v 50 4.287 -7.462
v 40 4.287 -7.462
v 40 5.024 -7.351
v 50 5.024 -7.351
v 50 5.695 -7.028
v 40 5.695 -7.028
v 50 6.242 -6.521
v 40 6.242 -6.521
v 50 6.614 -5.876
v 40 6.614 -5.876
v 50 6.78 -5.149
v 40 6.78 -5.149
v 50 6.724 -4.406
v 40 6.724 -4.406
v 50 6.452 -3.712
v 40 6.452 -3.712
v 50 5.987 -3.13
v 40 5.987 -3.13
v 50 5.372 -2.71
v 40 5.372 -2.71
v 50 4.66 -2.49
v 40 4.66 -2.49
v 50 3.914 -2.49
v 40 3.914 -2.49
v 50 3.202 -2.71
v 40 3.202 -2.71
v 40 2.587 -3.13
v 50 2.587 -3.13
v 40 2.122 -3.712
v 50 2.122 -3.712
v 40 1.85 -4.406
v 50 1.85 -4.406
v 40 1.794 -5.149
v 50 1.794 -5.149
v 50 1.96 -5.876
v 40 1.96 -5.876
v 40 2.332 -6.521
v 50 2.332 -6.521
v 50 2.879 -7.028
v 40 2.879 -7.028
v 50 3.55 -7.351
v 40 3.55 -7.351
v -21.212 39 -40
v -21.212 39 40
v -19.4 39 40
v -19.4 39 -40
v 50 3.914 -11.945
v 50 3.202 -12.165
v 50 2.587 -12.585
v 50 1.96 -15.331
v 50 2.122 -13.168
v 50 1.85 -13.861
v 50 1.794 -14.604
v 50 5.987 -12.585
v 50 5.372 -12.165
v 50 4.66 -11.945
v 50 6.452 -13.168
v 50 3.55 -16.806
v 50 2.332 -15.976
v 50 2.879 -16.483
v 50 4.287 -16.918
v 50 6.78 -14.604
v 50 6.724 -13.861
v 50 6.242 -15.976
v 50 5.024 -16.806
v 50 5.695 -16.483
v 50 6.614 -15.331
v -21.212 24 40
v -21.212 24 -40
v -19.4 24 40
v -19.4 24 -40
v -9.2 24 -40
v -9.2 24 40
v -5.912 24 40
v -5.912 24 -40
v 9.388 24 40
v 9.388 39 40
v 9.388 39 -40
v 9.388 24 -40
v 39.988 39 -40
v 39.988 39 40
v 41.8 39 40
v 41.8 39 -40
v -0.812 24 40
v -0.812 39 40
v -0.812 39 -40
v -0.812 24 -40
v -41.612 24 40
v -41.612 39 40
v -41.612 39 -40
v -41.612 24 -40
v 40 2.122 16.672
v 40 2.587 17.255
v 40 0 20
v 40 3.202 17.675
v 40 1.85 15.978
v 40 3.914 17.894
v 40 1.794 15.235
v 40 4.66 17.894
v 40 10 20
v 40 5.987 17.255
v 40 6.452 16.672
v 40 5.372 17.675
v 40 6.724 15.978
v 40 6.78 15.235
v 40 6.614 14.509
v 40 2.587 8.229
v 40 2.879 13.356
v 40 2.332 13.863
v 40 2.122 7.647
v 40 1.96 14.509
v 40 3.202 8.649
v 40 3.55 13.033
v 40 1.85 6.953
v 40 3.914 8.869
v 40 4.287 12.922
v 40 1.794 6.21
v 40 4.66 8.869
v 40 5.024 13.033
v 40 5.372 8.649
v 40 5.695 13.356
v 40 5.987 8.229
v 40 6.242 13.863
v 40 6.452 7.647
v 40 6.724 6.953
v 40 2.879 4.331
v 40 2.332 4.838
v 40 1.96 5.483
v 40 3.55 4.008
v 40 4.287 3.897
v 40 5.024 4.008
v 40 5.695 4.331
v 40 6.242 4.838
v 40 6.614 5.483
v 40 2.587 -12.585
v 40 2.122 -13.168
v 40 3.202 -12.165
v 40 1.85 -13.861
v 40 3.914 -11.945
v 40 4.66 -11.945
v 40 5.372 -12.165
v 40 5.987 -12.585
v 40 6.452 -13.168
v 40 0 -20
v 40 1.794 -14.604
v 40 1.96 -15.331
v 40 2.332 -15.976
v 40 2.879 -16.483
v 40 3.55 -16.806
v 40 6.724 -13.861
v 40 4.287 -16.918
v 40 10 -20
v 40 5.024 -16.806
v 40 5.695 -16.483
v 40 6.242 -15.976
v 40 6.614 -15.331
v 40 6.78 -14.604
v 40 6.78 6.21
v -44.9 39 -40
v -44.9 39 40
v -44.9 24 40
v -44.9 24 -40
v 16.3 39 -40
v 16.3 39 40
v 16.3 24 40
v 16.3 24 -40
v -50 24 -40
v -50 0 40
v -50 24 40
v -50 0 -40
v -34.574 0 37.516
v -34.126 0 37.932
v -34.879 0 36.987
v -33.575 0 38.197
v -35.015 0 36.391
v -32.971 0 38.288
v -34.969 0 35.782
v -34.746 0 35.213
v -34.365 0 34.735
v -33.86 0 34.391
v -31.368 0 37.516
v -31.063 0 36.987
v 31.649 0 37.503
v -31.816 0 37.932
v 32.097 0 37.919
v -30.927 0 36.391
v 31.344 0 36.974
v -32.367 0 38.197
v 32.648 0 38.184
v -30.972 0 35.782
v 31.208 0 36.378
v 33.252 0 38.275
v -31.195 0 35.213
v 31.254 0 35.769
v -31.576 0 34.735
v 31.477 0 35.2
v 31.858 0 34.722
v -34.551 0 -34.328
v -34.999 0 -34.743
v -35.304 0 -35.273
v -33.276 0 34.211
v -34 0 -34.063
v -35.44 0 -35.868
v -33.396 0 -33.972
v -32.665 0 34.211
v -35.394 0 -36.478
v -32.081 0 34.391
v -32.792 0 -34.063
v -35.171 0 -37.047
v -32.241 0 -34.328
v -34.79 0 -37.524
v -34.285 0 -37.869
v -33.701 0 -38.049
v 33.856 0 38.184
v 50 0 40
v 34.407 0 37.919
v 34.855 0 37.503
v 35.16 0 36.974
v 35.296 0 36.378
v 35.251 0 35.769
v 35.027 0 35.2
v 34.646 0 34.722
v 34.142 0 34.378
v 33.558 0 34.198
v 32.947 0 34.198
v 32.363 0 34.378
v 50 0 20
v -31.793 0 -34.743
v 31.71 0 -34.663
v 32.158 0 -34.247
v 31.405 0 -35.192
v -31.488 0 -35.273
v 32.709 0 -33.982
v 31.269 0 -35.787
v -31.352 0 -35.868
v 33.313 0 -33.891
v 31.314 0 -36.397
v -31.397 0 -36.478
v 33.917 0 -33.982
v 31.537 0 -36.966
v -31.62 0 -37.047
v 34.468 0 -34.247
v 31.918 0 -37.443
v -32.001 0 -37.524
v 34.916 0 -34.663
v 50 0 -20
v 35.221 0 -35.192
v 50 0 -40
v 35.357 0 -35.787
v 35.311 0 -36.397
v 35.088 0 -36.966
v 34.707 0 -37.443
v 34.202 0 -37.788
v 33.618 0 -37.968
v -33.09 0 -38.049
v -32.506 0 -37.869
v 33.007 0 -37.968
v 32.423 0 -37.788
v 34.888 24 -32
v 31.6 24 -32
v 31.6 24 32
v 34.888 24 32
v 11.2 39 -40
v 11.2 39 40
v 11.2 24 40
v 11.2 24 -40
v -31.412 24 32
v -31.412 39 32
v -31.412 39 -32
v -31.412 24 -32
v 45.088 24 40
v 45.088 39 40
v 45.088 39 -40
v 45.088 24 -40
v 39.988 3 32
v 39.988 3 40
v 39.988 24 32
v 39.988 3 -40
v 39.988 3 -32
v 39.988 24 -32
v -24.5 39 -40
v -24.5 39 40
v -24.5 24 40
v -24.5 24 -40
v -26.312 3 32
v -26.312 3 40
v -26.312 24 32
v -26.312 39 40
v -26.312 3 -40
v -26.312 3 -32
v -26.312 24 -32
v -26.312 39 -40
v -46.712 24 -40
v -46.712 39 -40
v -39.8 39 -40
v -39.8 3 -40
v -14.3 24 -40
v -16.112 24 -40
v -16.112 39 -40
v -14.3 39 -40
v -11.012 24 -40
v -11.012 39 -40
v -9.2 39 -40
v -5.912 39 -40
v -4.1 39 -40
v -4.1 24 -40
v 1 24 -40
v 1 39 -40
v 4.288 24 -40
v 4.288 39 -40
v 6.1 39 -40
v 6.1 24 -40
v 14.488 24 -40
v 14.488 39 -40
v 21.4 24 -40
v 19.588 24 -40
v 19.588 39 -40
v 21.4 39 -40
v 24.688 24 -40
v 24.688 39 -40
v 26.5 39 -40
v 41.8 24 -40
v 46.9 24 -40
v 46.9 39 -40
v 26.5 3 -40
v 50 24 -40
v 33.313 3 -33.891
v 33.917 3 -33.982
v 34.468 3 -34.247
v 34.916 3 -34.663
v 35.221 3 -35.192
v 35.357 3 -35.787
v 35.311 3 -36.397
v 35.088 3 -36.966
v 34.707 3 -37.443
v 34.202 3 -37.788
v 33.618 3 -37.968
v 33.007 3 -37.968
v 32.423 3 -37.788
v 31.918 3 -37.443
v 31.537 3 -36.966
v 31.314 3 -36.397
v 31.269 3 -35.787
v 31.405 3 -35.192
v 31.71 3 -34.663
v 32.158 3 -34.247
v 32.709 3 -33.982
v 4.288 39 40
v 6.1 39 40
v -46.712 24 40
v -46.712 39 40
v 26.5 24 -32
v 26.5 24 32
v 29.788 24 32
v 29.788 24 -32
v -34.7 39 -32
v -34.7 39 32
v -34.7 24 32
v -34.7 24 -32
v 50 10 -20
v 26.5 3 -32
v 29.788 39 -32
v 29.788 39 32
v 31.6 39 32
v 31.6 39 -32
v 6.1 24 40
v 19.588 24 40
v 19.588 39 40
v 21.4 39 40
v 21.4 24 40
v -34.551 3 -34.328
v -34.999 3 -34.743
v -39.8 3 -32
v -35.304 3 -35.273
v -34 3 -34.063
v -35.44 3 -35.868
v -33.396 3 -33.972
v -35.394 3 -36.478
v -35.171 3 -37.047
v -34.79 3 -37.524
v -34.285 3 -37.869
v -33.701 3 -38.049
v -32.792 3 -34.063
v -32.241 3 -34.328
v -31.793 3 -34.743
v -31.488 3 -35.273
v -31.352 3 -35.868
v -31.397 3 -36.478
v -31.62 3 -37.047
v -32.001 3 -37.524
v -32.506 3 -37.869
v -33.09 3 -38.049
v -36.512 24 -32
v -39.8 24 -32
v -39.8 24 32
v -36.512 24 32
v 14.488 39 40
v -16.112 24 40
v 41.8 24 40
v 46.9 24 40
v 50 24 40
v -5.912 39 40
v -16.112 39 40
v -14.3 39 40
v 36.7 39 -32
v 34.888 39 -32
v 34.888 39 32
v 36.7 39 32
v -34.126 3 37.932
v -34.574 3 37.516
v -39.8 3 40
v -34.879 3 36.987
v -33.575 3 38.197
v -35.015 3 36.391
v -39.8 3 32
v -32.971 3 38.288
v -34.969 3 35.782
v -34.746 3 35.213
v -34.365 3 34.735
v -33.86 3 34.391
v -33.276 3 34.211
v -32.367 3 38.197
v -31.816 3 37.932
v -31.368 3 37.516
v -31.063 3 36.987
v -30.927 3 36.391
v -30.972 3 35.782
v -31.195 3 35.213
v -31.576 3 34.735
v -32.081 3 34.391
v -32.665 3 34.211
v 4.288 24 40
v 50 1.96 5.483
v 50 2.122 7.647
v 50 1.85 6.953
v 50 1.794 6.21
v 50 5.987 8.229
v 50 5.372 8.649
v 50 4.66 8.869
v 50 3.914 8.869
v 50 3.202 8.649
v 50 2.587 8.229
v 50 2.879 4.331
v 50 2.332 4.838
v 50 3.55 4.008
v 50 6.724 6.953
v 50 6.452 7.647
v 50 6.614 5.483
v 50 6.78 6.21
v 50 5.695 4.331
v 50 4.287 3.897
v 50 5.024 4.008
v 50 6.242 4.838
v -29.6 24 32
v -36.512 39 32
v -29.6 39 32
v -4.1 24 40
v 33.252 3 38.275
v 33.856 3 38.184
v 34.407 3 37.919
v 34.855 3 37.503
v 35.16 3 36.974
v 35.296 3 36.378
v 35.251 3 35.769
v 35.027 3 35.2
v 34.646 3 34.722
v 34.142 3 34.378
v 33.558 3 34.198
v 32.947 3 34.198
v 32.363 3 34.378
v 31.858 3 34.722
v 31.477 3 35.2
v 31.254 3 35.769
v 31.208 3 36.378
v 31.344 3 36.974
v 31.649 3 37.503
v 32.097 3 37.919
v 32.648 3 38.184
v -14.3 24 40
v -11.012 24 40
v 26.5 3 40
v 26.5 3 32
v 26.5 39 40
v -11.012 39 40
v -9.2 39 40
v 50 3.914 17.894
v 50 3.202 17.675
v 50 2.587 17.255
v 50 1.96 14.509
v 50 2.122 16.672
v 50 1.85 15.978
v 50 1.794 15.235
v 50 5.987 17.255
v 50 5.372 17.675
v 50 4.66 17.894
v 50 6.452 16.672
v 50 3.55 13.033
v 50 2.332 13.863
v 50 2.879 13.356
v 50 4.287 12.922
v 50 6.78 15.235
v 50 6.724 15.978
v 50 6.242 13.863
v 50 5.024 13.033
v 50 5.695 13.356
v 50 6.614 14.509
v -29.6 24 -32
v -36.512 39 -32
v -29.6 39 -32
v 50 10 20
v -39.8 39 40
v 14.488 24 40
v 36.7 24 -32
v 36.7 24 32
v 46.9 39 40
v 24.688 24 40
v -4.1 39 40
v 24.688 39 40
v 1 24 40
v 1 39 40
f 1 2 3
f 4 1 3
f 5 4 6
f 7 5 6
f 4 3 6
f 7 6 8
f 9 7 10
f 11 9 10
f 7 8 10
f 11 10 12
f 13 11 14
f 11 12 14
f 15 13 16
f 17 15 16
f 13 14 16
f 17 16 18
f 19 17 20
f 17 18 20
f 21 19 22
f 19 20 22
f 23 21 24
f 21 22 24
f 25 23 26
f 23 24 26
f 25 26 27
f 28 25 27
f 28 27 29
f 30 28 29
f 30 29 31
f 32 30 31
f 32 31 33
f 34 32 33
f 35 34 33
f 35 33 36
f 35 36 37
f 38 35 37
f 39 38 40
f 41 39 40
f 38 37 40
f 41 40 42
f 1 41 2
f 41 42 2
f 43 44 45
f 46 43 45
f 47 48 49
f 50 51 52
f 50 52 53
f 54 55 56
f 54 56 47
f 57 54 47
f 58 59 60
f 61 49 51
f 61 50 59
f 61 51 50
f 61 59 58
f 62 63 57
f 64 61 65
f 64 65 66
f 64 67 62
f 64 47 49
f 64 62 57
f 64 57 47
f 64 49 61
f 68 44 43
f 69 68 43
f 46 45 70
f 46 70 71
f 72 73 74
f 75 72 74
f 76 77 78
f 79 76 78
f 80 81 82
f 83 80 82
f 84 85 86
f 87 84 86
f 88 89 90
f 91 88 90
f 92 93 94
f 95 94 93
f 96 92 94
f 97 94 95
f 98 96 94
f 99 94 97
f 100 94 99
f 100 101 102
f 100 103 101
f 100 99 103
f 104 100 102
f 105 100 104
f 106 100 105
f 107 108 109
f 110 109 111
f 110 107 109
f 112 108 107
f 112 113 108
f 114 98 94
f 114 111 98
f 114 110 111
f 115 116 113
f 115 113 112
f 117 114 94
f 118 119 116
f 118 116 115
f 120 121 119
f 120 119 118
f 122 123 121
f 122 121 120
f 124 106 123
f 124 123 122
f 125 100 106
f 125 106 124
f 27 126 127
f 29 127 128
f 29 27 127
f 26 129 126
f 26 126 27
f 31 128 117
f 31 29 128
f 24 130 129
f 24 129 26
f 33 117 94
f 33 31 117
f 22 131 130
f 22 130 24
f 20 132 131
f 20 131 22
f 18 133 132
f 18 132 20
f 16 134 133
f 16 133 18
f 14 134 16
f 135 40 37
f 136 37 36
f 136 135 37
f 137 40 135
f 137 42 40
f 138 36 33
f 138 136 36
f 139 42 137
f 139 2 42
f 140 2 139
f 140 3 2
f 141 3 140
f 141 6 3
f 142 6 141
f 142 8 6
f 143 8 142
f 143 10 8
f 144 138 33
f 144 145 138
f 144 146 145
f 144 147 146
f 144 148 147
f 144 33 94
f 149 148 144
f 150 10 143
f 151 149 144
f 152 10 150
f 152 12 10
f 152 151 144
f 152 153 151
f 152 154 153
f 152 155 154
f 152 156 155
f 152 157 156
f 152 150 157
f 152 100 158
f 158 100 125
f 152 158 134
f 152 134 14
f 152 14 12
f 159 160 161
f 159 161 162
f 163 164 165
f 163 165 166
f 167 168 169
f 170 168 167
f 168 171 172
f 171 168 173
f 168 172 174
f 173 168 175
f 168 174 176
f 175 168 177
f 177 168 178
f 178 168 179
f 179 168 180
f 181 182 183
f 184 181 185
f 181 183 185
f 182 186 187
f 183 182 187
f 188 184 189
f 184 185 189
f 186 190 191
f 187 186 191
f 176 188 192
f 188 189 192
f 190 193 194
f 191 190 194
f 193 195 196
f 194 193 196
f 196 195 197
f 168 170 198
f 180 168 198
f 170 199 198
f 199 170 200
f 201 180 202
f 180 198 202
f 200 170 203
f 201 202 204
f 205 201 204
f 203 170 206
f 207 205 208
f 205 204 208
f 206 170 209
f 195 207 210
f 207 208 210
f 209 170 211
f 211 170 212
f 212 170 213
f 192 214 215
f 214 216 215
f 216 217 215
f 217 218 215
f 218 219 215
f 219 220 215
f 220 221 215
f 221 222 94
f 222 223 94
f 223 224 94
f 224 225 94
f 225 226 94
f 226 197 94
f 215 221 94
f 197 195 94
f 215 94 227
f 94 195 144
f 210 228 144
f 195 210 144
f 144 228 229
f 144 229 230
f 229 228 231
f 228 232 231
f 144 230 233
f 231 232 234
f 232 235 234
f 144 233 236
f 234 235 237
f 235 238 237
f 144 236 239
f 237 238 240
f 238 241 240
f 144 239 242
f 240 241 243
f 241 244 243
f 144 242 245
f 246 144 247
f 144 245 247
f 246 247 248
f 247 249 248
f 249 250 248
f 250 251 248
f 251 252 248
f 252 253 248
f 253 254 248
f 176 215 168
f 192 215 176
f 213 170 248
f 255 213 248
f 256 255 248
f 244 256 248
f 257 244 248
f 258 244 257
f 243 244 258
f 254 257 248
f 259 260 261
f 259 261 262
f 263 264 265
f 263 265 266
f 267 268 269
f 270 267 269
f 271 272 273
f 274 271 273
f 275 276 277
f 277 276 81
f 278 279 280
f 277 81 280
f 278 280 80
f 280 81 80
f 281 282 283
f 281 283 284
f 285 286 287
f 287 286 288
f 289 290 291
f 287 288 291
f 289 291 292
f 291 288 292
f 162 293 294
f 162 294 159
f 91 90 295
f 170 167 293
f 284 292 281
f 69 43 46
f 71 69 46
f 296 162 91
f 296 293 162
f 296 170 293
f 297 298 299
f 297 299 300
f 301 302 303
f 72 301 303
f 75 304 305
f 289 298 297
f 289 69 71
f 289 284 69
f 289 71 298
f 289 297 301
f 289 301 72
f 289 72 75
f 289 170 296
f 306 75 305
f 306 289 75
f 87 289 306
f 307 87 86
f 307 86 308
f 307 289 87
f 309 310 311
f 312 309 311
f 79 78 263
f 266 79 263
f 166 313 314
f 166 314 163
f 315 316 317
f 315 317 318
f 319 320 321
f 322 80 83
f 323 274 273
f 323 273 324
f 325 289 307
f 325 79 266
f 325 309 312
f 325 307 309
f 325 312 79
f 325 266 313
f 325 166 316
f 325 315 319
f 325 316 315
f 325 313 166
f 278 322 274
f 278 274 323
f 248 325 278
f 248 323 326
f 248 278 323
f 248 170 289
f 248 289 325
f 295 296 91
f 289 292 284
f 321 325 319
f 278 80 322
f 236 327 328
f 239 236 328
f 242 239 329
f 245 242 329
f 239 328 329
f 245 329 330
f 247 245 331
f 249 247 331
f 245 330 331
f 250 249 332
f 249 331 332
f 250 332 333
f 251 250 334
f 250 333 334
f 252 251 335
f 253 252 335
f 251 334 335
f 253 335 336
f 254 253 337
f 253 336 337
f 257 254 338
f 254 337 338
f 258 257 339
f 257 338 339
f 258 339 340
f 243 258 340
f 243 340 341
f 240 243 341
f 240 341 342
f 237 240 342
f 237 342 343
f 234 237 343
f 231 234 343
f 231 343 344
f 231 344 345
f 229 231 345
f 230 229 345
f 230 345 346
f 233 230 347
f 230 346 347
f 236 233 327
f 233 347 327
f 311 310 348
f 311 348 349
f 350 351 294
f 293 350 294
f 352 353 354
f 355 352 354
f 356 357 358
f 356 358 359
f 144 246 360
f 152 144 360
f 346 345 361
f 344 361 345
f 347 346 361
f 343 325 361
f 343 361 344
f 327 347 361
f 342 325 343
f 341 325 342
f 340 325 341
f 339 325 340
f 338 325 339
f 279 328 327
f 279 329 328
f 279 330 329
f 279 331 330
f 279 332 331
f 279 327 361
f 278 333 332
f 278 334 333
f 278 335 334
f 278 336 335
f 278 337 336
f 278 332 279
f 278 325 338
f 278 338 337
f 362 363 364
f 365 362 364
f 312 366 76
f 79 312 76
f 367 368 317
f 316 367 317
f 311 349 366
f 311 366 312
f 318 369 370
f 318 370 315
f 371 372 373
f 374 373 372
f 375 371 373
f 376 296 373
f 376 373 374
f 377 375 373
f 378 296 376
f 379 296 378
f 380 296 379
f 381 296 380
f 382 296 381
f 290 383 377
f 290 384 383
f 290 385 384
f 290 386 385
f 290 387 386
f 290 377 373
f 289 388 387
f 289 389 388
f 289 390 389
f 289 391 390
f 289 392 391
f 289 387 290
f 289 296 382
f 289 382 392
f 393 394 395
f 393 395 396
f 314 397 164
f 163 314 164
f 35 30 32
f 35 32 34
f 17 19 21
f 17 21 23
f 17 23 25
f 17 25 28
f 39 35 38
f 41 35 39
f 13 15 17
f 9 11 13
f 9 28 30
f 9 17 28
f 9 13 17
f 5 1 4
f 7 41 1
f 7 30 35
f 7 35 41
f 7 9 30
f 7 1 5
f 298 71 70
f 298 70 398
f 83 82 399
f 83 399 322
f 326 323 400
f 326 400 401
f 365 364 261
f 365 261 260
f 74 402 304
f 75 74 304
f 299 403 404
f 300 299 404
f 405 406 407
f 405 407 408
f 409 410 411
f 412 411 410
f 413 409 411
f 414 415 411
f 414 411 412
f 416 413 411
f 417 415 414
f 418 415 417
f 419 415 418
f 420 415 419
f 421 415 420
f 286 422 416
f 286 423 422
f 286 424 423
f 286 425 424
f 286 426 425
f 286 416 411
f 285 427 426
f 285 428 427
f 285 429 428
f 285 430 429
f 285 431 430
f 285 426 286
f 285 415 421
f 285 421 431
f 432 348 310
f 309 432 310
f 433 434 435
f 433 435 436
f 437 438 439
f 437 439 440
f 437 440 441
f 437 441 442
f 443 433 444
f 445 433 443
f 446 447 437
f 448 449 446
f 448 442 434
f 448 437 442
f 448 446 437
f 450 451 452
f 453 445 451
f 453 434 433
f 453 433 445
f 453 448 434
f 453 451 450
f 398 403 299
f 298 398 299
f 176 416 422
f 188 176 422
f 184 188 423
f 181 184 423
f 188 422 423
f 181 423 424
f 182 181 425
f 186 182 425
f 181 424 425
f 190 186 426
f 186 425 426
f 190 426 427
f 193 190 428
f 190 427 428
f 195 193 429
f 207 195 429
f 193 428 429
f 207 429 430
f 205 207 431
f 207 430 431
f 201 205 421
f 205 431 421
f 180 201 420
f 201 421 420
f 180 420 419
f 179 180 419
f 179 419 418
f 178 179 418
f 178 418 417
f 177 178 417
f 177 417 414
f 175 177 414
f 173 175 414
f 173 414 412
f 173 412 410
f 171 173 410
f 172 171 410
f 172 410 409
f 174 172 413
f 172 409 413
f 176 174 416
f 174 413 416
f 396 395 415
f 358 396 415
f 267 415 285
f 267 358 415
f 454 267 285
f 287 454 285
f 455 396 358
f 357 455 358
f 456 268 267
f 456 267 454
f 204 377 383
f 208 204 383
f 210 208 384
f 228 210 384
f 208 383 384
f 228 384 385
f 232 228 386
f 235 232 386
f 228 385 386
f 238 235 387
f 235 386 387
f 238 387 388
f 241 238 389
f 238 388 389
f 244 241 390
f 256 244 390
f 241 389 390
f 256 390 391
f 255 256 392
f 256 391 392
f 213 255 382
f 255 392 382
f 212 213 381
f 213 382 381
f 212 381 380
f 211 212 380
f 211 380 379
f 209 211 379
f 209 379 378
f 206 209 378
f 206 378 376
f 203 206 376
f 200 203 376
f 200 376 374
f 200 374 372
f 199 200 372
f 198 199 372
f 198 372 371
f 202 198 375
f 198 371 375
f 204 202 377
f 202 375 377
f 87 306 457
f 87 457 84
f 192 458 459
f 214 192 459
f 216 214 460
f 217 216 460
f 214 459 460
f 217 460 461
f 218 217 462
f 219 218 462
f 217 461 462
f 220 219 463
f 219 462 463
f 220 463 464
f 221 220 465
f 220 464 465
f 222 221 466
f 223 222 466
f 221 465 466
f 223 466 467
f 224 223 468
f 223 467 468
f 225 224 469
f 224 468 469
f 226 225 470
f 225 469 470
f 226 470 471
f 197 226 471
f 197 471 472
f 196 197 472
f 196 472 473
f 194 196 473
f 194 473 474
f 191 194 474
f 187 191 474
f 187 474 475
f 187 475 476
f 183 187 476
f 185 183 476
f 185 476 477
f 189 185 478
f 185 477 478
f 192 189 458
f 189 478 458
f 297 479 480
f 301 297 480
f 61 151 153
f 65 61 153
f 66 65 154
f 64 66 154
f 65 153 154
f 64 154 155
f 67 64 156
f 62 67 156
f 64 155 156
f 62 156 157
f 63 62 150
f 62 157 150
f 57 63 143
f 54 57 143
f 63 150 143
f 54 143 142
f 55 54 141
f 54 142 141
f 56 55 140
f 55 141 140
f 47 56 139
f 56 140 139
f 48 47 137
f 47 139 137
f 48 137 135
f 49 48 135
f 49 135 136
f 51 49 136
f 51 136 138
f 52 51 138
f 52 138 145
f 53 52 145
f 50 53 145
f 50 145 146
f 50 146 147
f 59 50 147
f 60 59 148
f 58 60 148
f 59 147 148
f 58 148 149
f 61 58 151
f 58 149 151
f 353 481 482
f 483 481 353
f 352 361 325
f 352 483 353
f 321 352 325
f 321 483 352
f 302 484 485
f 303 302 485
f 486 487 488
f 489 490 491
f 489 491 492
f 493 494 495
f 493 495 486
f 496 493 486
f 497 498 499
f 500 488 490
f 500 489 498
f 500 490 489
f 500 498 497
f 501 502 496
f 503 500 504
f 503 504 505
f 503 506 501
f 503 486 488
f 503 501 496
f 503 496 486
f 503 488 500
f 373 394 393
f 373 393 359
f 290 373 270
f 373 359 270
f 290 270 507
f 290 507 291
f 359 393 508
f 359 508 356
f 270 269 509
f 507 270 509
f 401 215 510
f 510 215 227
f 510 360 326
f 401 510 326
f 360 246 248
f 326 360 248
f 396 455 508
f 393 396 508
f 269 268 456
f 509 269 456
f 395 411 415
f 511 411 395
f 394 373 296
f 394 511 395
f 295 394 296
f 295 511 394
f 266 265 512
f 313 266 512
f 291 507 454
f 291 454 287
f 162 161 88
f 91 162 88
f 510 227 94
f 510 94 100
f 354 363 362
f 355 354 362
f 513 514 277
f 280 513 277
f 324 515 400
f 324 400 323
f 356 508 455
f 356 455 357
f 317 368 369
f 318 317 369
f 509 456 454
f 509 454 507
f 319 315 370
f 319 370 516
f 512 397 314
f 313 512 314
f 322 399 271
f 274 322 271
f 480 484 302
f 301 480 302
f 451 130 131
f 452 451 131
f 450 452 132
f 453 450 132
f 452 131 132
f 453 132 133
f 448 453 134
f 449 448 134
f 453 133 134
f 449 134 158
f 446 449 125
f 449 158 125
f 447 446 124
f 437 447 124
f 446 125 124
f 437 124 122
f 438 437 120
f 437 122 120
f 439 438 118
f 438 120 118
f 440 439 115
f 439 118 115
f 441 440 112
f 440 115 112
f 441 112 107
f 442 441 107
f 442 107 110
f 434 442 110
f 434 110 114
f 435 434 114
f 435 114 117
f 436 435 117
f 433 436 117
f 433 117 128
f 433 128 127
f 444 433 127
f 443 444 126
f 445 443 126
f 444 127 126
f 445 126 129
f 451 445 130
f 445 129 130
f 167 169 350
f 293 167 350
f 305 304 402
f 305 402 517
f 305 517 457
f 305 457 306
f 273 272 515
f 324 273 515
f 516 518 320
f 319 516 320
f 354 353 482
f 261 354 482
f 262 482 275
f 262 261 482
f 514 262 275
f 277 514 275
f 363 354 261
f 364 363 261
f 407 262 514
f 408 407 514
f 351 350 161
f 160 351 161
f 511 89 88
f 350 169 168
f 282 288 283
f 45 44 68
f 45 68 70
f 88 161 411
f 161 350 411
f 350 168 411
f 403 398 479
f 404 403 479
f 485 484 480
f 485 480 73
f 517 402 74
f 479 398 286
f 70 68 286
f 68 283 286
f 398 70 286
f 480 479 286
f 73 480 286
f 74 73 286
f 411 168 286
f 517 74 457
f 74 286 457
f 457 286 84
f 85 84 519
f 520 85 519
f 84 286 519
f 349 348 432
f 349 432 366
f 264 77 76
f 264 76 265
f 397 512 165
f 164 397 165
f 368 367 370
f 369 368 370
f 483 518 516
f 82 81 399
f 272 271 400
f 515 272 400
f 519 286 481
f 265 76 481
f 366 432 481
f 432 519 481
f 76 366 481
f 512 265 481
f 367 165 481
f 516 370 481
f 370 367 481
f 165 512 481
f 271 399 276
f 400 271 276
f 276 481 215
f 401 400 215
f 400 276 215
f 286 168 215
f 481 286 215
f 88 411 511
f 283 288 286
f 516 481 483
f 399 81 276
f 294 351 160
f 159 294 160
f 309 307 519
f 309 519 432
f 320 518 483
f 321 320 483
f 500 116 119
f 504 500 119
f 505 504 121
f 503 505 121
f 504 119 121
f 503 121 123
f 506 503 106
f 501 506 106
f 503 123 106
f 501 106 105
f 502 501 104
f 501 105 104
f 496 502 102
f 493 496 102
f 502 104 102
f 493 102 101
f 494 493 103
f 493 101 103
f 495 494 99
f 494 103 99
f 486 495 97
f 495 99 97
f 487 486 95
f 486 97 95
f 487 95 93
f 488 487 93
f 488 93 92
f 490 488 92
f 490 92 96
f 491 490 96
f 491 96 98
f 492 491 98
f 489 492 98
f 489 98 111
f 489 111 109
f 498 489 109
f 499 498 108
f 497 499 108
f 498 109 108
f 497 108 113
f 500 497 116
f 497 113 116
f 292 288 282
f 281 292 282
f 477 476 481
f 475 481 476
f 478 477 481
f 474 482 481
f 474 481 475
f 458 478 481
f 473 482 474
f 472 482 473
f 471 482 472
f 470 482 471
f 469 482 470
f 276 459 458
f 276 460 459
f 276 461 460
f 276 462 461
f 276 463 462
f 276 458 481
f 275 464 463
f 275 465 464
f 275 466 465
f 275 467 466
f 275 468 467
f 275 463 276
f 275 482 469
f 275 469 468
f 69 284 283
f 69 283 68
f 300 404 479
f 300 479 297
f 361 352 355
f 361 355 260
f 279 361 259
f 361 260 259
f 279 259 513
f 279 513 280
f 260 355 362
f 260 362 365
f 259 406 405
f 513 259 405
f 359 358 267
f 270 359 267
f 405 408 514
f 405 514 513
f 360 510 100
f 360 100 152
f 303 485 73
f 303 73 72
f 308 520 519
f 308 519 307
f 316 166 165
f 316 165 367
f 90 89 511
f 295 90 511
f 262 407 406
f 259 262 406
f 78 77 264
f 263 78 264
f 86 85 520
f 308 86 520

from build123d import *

# Parameters (mm, degrees)
SKETCH_1_W           = 100
SKETCH_1_H           = 80
EXTRUDE_1_DEPTH      = 39
SKETCH_2_W           = 3.287907932
SKETCH_2_H           = 80
CUT_EXTRUDE_1_DEPTH  = 15
SKETCH_3_W           = 13.487907932
SKETCH_3_H           = 8
CUT_EXTRUDE_2_DEPTH  = 21
SKETCH_3_2_W         = 13.487907932
SKETCH_3_2_H         = 8
CUT_EXTRUDE_3_DEPTH  = 15
SKETCH_4_W           = 13.487907932
SKETCH_4_H           = 8
CUT_EXTRUDE_4_DEPTH  = 21
SKETCH_4_3_W         = 13.487907932
SKETCH_4_3_H         = 8
CUT_EXTRUDE_5_DEPTH  = 15
SKETCH_5_W           = 13.487907932
SKETCH_5_H           = 8
CUT_EXTRUDE_6_DEPTH  = 21
SKETCH_5_2_W         = 13.487907932
SKETCH_5_2_H         = 8
CUT_EXTRUDE_7_DEPTH  = 15
SKETCH_6_W           = 13.487907932
SKETCH_6_H           = 8
CUT_EXTRUDE_8_DEPTH  = 21
SKETCH_6_2_W         = 13.487907932
SKETCH_6_2_H         = 8
CUT_EXTRUDE_9_DEPTH  = 36
SKETCH_7_R           = 2.05
CUT_EXTRUDE_10_DEPTH = 3
SKETCH_8_R           = 2.05
CUT_EXTRUDE_11_DEPTH = 3
SKETCH_9_R           = 2.05
CUT_EXTRUDE_12_DEPTH = 3
SKETCH_10_R          = 2.05
CUT_EXTRUDE_13_DEPTH = 3
SKETCH_11_W          = 40
SKETCH_11_H          = 20
CUT_EXTRUDE_14_DEPTH = 10
SKETCH_12_R          = 2.5
EXTRUDE_2_DEPTH      = 10


with BuildPart() as part:
    # 草图1 → 凸台-拉伸1 (new body)
    with BuildSketch(Plane(origin=(0, 0, 0), x_dir=(1, 0, 0), z_dir=(0, 1, 0))):
        Rectangle(SKETCH_1_W, SKETCH_1_H)
    extrude(amount=EXTRUDE_1_DEPTH)

    # 草图2 → 切除-拉伸1 (cut)
    with BuildSketch(Plane(origin=(0, 39, 0), x_dir=(1, 0, 0), z_dir=(0, 1, 0))):
        with Locations((-48.356046034, 0)):
            Rectangle(SKETCH_2_W, SKETCH_2_H)
        with Locations((-43.256046034, 0)):
            Rectangle(SKETCH_2_W, SKETCH_2_H)
        with Locations((-38.156046034, 0)):
            Rectangle(SKETCH_2_W, SKETCH_2_H)
        with Locations((-33.056046034, 0)):
            Rectangle(SKETCH_2_W, SKETCH_2_H)
        with Locations((-27.956046034, 0)):
            Rectangle(SKETCH_2_W, SKETCH_2_H)
        with Locations((-22.856046034, 0)):
            Rectangle(SKETCH_2_W, SKETCH_2_H)
        with Locations((-17.756046034, 0)):
            Rectangle(SKETCH_2_W, SKETCH_2_H)
        with Locations((-12.656046034, 0)):
            Rectangle(SKETCH_2_W, SKETCH_2_H)
        with Locations((-7.556046034, 0)):
            Rectangle(SKETCH_2_W, SKETCH_2_H)
        with Locations((-2.456046034, 0)):
            Rectangle(SKETCH_2_W, SKETCH_2_H)
        with Locations((2.643953966, 0)):
            Rectangle(SKETCH_2_W, SKETCH_2_H)
        with Locations((7.743953966, 0)):
            Rectangle(SKETCH_2_W, SKETCH_2_H)
        with Locations((12.843953966, 0)):
            Rectangle(SKETCH_2_W, SKETCH_2_H)
        with Locations((17.943953966, 0)):
            Rectangle(SKETCH_2_W, SKETCH_2_H)
        with Locations((23.043953966, 0)):
            Rectangle(SKETCH_2_W, SKETCH_2_H)
        with Locations((28.143953966, 0)):
            Rectangle(SKETCH_2_W, SKETCH_2_H)
        with Locations((33.243953966, 0)):
            Rectangle(SKETCH_2_W, SKETCH_2_H)
        with Locations((38.343953966, 0)):
            Rectangle(SKETCH_2_W, SKETCH_2_H)
        with Locations((43.443953966, 0)):
            Rectangle(SKETCH_2_W, SKETCH_2_H)
        with Locations((48.543953966, 0)):
            Rectangle(SKETCH_2_W, SKETCH_2_H)
    extrude(amount=-CUT_EXTRUDE_1_DEPTH, mode=Mode.SUBTRACT)

    # 草图3 → 切除-拉伸2 (cut)
    with BuildSketch(Plane(origin=(0, 24, 0), x_dir=(1, 0, 0), z_dir=(0, 1, 0))):
        with Locations((-33.056046034, 36)):
            Rectangle(SKETCH_3_W, SKETCH_3_H)
    extrude(amount=-CUT_EXTRUDE_2_DEPTH, mode=Mode.SUBTRACT)

    # 草图3<2> → 切除-拉伸3 (cut)
    with BuildSketch(Plane(origin=(0, 24, 0), x_dir=(1, 0, 0), z_dir=(0, 1, 0))):
        with Locations((-33.056046034, 36)):
            Rectangle(SKETCH_3_2_W, SKETCH_3_2_H)
    extrude(amount=CUT_EXTRUDE_3_DEPTH, mode=Mode.SUBTRACT)

    # 草图4 → 切除-拉伸4 (cut)
    with BuildSketch(Plane(origin=(0, 24, 0), x_dir=(1, 0, 0), z_dir=(0, 1, 0))):
        with Locations((33.243953966, 36)):
            Rectangle(SKETCH_4_W, SKETCH_4_H)
    extrude(amount=-CUT_EXTRUDE_4_DEPTH, mode=Mode.SUBTRACT)

    # 草图4<3> → 切除-拉伸5 (cut)
    with BuildSketch(Plane(origin=(0, 24, 0), x_dir=(1, 0, 0), z_dir=(0, 1, 0))):
        with Locations((33.243953966, 36)):
            Rectangle(SKETCH_4_3_W, SKETCH_4_3_H)
    extrude(amount=CUT_EXTRUDE_5_DEPTH, mode=Mode.SUBTRACT)

    # 草图5 → 切除-拉伸6 (cut)
    with BuildSketch(Plane(origin=(0, 24, 0), x_dir=(1, 0, 0), z_dir=(0, 1, 0))):
        with Locations((-33.056046034, -36)):
            Rectangle(SKETCH_5_W, SKETCH_5_H)
    extrude(amount=-CUT_EXTRUDE_6_DEPTH, mode=Mode.SUBTRACT)

    # 草图5<2> → 切除-拉伸7 (cut)
    with BuildSketch(Plane(origin=(0, 24, 0), x_dir=(1, 0, 0), z_dir=(0, 1, 0))):
        with Locations((-33.056046034, -36)):
            Rectangle(SKETCH_5_2_W, SKETCH_5_2_H)
    extrude(amount=CUT_EXTRUDE_7_DEPTH, mode=Mode.SUBTRACT)

    # 草图6 → 切除-拉伸8 (cut)
    with BuildSketch(Plane(origin=(0, 39, 0), x_dir=(1, 0, 0), z_dir=(0, 1, 0))):
        with Locations((33.243953966, -36)):
            Rectangle(SKETCH_6_W, SKETCH_6_H)
    extrude(amount=-CUT_EXTRUDE_8_DEPTH, mode=Mode.SUBTRACT)

    # 草图6<2> → 切除-拉伸9 (cut)
    with BuildSketch(Plane(origin=(0, 39, 0), x_dir=(1, 0, 0), z_dir=(0, 1, 0))):
        with Locations((33.243953966, -36)):
            Rectangle(SKETCH_6_2_W, SKETCH_6_2_H)
    extrude(amount=-CUT_EXTRUDE_9_DEPTH, mode=Mode.SUBTRACT)

    # 草图7 → 切除-拉伸10 (cut)
    with BuildSketch(Plane(origin=(0, 3, 0), x_dir=(1, 0, 0), z_dir=(0, 1, 0))):
        with Locations((-33.395851618, 36.021594171)):
            Circle(SKETCH_7_R)
    extrude(amount=-CUT_EXTRUDE_10_DEPTH, mode=Mode.SUBTRACT)

    # 草图8 → 切除-拉伸11 (cut)
    with BuildSketch(Plane(origin=(0, 3, 0), x_dir=(1, 0, 0), z_dir=(0, 1, 0))):
        with Locations((33.312820736, 35.94065507)):
            Circle(SKETCH_8_R)
    extrude(amount=-CUT_EXTRUDE_11_DEPTH, mode=Mode.SUBTRACT)

    # 草图9 → 切除-拉伸12 (cut)
    with BuildSketch(Plane(origin=(0, 3, 0), x_dir=(1, 0, 0), z_dir=(0, 1, 0))):
        with Locations((-32.970812698, -36.238015002)):
            Circle(SKETCH_9_R)
    extrude(amount=-CUT_EXTRUDE_12_DEPTH, mode=Mode.SUBTRACT)

    # 草图10 → 切除-拉伸13 (cut)
    with BuildSketch(Plane(origin=(0, 3, 0), x_dir=(1, 0, 0), z_dir=(0, 1, 0))):
        with Locations((33.252132878, -36.225040763)):
            Circle(SKETCH_10_R)
    extrude(amount=-CUT_EXTRUDE_13_DEPTH, mode=Mode.SUBTRACT)

    # 草图11 → 切除-拉伸14 (cut)
    with BuildSketch(Plane(origin=(50, 0, 0), x_dir=(0, 0, -1), z_dir=(1, 0, 0))):
        Rectangle(SKETCH_11_W, SKETCH_11_H)
    extrude(amount=-CUT_EXTRUDE_14_DEPTH, mode=Mode.SUBTRACT)

    # 草图12 → 凸台-拉伸2 (add)
    with BuildSketch(Plane(origin=(40, 0, 0), x_dir=(0, 0, -1), z_dir=(1, 0, 0))):
        with Locations((-15.422086217, 4.286980586)):
            Circle(SKETCH_12_R)
        with Locations((-6.396528349, 4.286980586)):
            Circle(SKETCH_12_R)
        with Locations((4.962166927, 4.286980586)):
            Circle(SKETCH_12_R)
        with Locations((14.417513265, 4.286980586)):
            Circle(SKETCH_12_R)
    extrude(amount=EXTRUDE_2_DEPTH)


solid = part.part
